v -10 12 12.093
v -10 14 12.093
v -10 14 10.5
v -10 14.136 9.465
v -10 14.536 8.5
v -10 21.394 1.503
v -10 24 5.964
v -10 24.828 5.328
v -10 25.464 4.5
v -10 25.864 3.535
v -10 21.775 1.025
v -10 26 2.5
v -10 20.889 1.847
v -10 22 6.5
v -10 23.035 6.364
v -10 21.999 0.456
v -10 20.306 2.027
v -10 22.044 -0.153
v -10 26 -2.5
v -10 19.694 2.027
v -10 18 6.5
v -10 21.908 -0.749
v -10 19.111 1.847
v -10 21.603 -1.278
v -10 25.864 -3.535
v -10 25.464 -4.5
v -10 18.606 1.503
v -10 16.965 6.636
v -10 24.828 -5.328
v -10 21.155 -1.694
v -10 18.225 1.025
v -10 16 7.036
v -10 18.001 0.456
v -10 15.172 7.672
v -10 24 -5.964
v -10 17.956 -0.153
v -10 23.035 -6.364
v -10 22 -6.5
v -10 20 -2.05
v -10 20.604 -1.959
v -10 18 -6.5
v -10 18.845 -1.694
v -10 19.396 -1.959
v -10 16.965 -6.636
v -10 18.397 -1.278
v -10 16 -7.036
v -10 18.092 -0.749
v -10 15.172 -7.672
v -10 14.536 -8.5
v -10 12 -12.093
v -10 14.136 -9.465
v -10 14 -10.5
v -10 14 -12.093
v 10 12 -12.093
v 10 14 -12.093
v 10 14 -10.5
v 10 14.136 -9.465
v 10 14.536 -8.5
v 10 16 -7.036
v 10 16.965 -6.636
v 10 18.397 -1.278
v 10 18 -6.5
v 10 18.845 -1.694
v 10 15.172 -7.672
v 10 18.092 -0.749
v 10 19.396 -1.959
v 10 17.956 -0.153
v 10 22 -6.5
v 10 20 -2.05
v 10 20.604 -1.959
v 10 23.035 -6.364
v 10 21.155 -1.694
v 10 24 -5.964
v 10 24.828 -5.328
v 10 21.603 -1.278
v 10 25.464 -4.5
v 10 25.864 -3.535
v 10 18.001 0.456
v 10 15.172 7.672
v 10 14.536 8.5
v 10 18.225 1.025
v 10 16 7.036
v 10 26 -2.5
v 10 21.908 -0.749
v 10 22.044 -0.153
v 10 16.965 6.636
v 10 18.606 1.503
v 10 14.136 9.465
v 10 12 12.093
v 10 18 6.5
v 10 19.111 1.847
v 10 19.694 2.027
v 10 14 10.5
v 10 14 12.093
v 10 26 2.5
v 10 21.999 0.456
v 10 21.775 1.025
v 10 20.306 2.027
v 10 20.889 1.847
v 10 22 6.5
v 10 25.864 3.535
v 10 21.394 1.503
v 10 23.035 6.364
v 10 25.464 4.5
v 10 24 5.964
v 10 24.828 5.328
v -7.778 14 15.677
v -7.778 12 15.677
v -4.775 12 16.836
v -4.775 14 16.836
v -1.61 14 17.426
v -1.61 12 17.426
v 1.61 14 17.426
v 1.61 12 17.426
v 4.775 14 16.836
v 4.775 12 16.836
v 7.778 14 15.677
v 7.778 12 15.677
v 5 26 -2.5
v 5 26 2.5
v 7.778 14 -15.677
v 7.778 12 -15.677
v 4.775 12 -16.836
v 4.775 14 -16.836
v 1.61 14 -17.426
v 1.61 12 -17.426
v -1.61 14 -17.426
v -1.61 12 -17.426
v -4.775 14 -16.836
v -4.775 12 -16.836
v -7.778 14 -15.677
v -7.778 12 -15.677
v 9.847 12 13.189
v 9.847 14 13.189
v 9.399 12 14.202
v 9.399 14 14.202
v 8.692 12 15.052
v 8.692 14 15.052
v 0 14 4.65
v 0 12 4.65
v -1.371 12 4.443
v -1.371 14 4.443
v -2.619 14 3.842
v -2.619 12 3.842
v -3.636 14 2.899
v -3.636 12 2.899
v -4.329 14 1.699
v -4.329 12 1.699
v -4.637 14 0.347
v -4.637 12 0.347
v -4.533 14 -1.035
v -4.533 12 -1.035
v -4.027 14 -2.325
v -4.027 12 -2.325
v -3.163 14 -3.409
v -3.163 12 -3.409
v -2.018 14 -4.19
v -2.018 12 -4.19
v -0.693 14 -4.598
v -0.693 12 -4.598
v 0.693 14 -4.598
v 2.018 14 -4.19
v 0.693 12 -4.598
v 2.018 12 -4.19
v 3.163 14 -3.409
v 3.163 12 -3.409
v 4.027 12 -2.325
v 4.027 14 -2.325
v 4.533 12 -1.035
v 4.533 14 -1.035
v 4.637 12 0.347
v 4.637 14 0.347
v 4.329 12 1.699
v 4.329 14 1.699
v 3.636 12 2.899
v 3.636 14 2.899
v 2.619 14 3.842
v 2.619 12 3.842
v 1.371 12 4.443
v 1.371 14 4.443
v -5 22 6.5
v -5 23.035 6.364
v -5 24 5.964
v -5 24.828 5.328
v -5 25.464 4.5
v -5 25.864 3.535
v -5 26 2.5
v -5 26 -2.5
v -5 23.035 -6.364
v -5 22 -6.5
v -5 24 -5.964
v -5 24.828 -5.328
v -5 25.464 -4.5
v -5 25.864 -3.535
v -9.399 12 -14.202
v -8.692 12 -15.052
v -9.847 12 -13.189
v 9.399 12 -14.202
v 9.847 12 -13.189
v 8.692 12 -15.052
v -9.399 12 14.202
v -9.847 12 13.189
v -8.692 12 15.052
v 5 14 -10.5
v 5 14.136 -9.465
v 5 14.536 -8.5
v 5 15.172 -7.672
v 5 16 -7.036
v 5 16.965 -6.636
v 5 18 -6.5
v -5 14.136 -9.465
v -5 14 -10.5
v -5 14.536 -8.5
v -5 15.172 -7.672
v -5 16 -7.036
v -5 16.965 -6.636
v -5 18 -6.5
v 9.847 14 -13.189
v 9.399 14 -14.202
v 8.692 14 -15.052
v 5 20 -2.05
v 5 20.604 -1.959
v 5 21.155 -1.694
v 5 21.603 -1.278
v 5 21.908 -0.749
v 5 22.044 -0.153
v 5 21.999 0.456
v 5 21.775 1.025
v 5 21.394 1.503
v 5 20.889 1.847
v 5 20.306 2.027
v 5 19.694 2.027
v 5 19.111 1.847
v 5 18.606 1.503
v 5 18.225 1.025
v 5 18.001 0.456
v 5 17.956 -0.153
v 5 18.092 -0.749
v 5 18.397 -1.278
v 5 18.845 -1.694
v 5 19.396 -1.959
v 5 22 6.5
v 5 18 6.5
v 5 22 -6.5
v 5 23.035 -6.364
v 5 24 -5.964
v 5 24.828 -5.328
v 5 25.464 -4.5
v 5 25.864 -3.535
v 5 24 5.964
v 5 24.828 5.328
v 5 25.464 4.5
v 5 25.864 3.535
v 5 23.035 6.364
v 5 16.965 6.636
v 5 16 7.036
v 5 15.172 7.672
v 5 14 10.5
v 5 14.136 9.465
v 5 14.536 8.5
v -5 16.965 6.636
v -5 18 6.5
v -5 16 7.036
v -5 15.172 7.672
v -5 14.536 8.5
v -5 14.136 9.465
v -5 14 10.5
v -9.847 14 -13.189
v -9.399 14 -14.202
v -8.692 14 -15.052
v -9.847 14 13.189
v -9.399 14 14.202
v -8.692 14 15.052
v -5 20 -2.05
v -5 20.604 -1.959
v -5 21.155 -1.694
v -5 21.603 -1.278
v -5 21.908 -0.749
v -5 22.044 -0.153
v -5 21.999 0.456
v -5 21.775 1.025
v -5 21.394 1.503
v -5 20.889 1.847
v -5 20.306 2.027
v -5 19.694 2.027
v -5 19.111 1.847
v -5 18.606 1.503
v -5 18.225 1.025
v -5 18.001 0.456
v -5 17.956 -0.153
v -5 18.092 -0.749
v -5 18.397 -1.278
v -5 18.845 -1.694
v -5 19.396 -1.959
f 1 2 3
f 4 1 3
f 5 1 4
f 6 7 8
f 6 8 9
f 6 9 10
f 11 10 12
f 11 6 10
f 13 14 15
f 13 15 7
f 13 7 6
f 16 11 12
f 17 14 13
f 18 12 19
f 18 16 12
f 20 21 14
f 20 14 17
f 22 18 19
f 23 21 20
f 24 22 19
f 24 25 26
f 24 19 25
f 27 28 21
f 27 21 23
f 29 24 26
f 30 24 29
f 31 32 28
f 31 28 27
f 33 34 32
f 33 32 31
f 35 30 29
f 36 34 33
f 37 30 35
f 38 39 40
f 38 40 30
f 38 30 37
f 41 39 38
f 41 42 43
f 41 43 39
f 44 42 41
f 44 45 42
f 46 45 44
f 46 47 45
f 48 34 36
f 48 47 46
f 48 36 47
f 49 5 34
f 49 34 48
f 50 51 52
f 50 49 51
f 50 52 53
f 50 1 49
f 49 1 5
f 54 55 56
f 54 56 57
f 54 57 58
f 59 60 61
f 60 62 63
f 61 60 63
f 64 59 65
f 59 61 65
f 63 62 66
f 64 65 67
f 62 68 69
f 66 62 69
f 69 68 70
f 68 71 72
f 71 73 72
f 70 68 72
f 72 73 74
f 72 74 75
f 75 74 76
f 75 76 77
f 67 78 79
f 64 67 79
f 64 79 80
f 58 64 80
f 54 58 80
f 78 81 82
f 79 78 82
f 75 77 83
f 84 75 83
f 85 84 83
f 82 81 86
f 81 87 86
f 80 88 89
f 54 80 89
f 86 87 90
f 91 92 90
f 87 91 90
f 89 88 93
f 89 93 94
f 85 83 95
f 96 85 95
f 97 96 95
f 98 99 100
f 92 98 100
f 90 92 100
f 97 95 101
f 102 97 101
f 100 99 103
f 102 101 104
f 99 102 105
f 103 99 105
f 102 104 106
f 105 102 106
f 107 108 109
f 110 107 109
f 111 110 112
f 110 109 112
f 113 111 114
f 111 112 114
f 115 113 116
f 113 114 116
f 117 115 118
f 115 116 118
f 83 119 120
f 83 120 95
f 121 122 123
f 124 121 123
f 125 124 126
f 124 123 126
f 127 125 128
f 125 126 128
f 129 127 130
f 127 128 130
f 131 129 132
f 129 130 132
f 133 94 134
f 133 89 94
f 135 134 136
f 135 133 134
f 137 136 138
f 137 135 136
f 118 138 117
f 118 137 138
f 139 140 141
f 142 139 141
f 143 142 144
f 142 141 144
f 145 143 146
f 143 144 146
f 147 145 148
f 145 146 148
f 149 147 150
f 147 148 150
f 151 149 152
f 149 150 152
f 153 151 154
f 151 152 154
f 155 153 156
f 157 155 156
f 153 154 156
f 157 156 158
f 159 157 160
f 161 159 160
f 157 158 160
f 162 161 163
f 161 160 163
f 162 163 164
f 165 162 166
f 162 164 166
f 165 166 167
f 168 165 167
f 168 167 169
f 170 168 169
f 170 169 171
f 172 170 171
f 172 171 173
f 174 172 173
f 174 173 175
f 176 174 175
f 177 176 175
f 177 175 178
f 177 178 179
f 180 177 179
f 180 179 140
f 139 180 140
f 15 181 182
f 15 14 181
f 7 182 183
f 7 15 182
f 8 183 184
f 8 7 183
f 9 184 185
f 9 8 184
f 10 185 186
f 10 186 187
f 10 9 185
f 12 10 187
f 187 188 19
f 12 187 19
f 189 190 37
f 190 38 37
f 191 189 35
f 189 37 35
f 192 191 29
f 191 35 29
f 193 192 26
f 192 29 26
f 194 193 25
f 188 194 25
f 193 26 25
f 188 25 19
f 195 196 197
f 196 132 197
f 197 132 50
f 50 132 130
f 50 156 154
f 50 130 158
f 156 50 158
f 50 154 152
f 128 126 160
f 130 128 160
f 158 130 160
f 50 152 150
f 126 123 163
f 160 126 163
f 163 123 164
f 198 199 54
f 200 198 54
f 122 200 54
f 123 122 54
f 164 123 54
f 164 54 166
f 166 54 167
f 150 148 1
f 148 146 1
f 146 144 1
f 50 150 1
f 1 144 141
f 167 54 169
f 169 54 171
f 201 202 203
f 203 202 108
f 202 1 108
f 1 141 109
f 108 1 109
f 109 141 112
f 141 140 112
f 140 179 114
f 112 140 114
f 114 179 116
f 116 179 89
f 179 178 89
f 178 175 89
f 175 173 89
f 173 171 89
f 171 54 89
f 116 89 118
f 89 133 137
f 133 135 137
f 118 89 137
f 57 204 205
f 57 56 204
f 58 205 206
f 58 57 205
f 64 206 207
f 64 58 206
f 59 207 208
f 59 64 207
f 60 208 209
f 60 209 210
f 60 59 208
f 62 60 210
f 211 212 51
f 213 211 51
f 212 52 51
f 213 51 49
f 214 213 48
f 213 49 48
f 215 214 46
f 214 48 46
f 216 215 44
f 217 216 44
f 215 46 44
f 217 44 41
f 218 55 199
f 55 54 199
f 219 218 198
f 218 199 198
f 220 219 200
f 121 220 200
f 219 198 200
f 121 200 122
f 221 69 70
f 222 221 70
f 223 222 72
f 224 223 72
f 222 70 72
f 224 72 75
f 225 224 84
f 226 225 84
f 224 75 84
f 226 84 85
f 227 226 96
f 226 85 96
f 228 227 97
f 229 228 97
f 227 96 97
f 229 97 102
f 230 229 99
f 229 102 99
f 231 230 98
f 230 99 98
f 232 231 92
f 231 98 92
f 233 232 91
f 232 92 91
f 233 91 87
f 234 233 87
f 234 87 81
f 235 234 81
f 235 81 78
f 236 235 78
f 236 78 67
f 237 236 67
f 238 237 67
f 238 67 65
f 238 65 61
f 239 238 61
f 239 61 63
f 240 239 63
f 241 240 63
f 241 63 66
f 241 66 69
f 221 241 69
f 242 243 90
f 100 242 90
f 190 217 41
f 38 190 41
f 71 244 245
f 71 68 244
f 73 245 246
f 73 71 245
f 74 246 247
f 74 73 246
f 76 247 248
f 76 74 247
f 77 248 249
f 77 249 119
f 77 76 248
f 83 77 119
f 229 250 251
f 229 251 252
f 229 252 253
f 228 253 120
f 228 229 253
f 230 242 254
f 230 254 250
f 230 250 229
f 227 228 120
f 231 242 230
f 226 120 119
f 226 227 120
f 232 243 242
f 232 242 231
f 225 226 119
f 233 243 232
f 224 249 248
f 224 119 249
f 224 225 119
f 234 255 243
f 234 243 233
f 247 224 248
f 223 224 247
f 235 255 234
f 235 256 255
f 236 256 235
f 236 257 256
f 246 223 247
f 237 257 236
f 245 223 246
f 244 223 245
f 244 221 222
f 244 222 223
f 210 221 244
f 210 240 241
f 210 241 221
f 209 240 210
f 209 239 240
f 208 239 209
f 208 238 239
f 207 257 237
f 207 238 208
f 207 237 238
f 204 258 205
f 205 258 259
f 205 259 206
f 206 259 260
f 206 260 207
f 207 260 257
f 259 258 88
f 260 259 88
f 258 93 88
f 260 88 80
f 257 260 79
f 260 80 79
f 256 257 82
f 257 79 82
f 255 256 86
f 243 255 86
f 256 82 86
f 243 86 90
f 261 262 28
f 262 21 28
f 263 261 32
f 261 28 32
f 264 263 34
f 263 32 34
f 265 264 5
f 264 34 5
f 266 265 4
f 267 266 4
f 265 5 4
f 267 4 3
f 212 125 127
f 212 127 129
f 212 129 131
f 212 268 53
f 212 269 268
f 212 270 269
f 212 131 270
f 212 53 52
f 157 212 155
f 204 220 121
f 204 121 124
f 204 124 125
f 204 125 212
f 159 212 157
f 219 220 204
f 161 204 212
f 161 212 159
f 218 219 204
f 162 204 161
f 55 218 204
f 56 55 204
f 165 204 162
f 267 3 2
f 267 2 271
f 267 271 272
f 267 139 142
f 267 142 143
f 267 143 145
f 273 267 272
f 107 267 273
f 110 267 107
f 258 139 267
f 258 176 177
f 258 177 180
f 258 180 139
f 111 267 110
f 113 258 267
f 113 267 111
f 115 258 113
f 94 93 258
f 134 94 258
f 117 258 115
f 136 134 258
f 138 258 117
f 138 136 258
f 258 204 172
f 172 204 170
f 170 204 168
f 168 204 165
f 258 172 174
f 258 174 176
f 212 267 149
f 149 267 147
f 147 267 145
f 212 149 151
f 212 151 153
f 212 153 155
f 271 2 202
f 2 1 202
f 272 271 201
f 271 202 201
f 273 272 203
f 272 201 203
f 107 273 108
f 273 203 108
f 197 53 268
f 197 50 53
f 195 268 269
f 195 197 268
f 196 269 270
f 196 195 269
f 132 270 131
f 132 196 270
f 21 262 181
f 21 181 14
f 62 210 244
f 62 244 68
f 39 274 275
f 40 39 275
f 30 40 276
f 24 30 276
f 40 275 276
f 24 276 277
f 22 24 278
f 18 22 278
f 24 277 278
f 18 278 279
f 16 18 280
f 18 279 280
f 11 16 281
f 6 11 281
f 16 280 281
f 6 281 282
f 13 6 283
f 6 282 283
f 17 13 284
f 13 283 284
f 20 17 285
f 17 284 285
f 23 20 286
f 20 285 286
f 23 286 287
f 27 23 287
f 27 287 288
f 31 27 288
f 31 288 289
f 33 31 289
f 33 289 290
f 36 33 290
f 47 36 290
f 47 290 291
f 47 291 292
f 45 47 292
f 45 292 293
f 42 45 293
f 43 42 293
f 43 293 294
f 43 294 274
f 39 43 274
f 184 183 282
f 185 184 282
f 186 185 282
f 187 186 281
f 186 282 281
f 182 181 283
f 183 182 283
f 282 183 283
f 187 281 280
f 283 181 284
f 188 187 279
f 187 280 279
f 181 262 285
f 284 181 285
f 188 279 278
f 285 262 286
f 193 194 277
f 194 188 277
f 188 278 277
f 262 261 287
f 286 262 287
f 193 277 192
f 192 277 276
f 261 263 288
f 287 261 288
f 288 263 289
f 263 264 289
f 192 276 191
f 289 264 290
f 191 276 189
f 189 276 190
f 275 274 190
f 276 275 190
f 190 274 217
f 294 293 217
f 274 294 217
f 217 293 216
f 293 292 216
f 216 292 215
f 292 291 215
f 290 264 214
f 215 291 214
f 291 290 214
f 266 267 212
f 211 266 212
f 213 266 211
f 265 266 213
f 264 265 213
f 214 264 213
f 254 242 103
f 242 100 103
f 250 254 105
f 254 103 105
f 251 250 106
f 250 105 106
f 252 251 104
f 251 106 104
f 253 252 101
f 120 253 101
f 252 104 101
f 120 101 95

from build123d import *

# Parameters (mm, degrees)
SKETCH1_R           = 4.65
BOSS_EXTRUDE1_DEPTH = 12
SKETCH2_R           = 17.5
BOSS_EXTRUDE2_DEPTH = 2
SKETCH3_W           = 5
SKETCH3_H           = 13
BOSS_EXTRUDE3_DEPTH = 12
FILLET1_R           = 4
FILLET2_R           = 4
CUT_EXTRUDE1_DEPTH  = 29.434134416
SKETCH5_R           = 2.05
CUT_EXTRUDE2_DEPTH  = 70
FILLET3_R           = 4
SKETCH6_R           = 4.65
CUT_EXTRUDE3_DEPTH  = 33.897568299


with BuildPart() as part:
    # Sketch1 → Boss-Extrude1 (new body)
    with BuildSketch(Plane(origin=(0, 0, 0), x_dir=(1, 0, 0), z_dir=(0, 1, 0))):
        with Locations(Location((0, 0, 0), (0, 0, 270))):
            Circle(SKETCH1_R)
    extrude(amount=BOSS_EXTRUDE1_DEPTH)

    # Sketch2 → Boss-Extrude2 (add)
    with BuildSketch(Plane(origin=(0, 12, 0), x_dir=(1, 0, 0), z_dir=(0, 1, 0))):
        with Locations(Location((0, 0, 0), (0, 0, 270))):
            Circle(SKETCH2_R)
    extrude(amount=BOSS_EXTRUDE2_DEPTH)

    # Sketch3 → Boss-Extrude3 (add)
    with BuildSketch(Plane(origin=(0, 14, 0), x_dir=(1, 0, 0), z_dir=(0, 1, 0))):
        with Locations((7.5, 0)):
            Rectangle(SKETCH3_W, SKETCH3_H)
    boss_extrude3 = extrude(amount=BOSS_EXTRUDE3_DEPTH)

    # Mirror1: Boss-Extrude3 across plane
    add(boss_extrude3.mirror(Plane(origin=(0, 0, 0), x_dir=(0, 0, 1), z_dir=(1, 0, 0))))

    # Fillet1
    fillet1_edges = [part.edges().sort_by_distance(p)[0] for p in [
        (7.5, 26, -6.5),
        (7.5, 26, 6.5),
        (-7.5, 26, 6.5),
        (-7.5, 26, -6.5),
    ]]
    fillet(fillet1_edges, radius=FILLET1_R)

    # Fillet2
    fillet2_edges = [part.edges().sort_by_distance(p)[0] for p in [
        (7.5, 14, 6.5),
        (7.5, 14, -6.5),
        (-7.5, 14, -6.5),
        (-7.5, 14, 6.5),
    ]]
    fillet(fillet2_edges, radius=FILLET2_R)

    # Sketch4 → Cut-Extrude1 (cut, through all)
    with BuildSketch(Plane(origin=(0, 14, 0), x_dir=(1, 0, 0), z_dir=(0, 1, 0))):
        with BuildLine():
            Line((10, 14.361406616), (10, 0))
            Line((10, 0), (10, -14.361406616))
            ThreePointArc((10, -14.361406616), (15.512092057, -8.100925873), (17.5, 0))
            ThreePointArc((17.5, 0), (15.512092057, 8.100925873), (10, 14.361406616))
        make_face()
    cut_extrude1 = extrude(amount=-CUT_EXTRUDE1_DEPTH, mode=Mode.SUBTRACT)

    # Mirror2: Cut-Extrude1 across plane
    add(cut_extrude1.mirror(Plane(origin=(0, 0, 0), x_dir=(0, 0, 1), z_dir=(1, 0, 0))), mode=Mode.SUBTRACT)

    # Sketch5 → Cut-Extrude2 (cut)
    with BuildSketch(Plane(origin=(10, 0, 0), x_dir=(0, 0, -1), z_dir=(1, 0, 0))):
        with Locations((0, 20)):
            Circle(SKETCH5_R)
    extrude(amount=-CUT_EXTRUDE2_DEPTH, mode=Mode.SUBTRACT)

    # Fillet3
    fillet3_edges = [part.edges().sort_by_distance(p)[0] for p in [
        (10, 13, -14.361406616),
        (10, 13, 14.361406616),
        (-10, 13, 14.361406616),
        (-10, 13, -14.361406616),
    ]]
    fillet(fillet3_edges, radius=FILLET3_R)

    # Sketch6 → Cut-Extrude3 (cut, through all)
    with BuildSketch(Plane.XZ):
        with Locations(Location((0, 0, 0), (0, 0, 90))):
            Circle(SKETCH6_R)
    extrude(amount=-CUT_EXTRUDE3_DEPTH, mode=Mode.SUBTRACT)


solid = part.part
